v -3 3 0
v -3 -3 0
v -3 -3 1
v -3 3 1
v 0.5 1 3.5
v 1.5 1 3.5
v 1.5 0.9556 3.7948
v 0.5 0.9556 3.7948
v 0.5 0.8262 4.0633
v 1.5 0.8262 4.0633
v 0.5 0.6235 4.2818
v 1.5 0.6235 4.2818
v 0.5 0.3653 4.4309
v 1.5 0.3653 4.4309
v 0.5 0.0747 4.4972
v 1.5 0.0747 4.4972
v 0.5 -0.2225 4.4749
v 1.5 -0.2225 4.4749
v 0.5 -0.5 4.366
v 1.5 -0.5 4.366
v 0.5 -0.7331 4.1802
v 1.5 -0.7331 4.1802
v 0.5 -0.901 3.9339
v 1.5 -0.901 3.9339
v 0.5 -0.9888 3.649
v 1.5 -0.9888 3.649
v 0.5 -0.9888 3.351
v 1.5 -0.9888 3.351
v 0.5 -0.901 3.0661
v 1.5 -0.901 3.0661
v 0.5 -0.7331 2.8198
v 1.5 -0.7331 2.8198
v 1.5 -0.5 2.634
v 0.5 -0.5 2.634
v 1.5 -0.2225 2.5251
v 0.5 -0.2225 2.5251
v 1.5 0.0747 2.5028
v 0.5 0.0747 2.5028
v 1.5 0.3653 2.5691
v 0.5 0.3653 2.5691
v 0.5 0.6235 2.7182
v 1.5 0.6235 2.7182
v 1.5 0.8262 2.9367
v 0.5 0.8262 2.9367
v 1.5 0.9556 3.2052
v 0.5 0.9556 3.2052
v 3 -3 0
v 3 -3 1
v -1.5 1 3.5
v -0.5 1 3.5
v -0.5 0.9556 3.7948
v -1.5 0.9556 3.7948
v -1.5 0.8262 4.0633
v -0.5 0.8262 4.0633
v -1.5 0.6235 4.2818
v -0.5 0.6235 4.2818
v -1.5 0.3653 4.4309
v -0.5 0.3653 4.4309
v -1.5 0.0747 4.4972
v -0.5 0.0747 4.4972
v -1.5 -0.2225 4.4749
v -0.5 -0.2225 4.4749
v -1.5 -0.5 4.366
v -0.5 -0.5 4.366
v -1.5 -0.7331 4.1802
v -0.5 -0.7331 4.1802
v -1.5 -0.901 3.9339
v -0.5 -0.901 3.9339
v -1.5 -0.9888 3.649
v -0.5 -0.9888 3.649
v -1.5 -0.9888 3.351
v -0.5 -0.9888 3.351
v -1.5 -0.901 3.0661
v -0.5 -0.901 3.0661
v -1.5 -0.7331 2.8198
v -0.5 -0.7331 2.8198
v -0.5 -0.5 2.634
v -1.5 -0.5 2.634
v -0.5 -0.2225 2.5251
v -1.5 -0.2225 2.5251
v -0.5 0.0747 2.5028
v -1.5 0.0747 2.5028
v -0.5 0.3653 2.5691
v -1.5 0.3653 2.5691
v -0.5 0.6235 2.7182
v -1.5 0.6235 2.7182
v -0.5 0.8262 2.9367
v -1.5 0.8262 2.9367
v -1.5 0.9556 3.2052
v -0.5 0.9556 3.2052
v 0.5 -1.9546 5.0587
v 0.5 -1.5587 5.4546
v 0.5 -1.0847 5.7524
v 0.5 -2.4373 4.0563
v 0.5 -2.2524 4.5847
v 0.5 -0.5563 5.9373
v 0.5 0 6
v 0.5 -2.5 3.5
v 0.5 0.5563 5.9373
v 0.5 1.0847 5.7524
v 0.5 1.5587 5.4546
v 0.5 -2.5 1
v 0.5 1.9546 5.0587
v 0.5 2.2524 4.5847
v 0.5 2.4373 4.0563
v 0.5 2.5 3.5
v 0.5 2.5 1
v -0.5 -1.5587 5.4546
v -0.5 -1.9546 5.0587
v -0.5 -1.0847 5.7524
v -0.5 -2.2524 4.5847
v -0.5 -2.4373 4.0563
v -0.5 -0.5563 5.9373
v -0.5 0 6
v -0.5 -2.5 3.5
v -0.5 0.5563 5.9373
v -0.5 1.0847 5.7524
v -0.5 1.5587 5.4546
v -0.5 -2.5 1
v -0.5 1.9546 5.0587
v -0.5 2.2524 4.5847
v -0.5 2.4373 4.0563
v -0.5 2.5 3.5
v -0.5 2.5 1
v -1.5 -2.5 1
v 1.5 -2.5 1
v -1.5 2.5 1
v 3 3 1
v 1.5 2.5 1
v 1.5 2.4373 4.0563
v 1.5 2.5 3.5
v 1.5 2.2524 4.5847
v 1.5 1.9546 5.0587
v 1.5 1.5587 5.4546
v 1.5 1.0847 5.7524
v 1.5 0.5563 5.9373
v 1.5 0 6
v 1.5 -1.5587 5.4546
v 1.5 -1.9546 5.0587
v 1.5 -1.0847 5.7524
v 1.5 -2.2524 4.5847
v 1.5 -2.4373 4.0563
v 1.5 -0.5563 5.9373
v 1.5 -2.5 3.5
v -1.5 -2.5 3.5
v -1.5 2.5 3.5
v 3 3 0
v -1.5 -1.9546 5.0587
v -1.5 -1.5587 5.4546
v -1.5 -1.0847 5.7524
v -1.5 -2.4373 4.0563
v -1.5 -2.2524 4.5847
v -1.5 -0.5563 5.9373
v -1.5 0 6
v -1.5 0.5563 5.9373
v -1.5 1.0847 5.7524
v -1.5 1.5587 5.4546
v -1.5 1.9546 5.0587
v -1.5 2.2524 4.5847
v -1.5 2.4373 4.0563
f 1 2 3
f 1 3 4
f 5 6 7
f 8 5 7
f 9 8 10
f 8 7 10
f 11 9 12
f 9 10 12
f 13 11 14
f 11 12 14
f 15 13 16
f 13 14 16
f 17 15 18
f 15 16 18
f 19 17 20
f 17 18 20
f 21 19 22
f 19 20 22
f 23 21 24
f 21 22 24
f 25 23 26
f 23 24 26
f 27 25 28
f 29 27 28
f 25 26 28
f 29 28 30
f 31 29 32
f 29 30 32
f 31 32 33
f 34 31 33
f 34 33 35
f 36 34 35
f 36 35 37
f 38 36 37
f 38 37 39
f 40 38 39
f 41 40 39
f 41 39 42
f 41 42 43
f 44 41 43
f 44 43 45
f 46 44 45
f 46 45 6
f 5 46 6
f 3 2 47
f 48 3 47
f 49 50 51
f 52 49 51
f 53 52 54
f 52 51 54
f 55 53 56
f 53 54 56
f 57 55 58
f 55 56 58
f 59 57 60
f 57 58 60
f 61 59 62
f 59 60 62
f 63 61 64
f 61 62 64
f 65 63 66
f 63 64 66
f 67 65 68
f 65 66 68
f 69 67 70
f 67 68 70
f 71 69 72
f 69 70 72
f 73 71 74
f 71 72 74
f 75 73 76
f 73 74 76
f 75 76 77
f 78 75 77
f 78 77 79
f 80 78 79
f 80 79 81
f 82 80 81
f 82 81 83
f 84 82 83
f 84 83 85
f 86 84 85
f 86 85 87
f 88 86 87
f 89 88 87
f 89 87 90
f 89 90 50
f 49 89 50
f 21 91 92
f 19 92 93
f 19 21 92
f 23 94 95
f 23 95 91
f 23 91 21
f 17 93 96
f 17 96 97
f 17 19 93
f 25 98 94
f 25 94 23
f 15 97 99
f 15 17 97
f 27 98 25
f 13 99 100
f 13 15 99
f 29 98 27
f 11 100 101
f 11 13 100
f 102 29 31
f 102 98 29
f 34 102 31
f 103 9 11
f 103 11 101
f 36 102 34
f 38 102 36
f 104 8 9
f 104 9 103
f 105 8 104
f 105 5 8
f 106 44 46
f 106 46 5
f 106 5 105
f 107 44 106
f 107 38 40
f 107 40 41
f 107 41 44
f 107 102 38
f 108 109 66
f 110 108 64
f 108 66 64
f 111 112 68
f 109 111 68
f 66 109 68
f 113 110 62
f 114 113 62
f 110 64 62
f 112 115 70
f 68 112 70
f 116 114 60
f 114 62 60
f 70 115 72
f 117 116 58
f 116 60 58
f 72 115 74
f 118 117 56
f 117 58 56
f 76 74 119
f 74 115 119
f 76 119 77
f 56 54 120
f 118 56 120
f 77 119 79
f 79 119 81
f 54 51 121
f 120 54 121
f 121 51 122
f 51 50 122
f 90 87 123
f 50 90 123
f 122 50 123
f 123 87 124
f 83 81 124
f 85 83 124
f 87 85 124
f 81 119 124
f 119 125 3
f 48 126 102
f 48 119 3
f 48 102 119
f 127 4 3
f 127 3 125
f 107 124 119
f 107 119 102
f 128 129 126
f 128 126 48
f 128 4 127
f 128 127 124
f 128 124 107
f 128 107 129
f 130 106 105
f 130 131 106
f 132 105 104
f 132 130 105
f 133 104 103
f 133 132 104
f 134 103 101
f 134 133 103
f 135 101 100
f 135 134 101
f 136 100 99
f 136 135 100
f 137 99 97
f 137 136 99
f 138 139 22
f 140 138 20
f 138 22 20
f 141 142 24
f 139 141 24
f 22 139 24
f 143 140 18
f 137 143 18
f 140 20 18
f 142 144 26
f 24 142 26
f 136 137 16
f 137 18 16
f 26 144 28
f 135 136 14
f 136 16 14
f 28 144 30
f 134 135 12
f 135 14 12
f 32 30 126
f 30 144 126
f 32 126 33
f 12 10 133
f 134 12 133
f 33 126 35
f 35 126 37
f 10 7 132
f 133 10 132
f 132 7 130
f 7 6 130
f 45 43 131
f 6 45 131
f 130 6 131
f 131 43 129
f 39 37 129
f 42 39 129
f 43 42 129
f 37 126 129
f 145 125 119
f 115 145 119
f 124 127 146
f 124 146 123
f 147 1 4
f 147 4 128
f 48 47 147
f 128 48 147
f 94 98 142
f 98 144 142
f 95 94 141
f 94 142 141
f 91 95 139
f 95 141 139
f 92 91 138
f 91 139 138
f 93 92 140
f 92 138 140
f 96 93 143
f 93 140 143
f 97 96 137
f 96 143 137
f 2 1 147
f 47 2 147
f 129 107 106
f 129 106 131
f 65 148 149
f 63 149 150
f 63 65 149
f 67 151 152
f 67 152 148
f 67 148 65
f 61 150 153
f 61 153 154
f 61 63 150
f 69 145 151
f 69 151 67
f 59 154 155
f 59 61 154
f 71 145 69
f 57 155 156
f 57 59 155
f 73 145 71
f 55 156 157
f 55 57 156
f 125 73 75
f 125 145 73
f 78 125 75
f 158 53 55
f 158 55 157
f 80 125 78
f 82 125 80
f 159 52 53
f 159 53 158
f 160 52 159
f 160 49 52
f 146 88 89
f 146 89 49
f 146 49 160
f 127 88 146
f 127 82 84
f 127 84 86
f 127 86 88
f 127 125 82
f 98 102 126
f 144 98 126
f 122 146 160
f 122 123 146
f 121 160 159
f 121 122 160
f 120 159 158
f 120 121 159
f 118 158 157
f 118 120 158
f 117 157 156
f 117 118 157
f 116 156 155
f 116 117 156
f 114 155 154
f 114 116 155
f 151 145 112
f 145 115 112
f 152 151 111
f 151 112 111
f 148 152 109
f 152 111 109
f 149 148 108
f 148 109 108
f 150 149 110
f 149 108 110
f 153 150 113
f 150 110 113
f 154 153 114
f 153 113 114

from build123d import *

# Parameters (mm, degrees)
F0_W     = 6
F0_H     = 6
F0_W_2   = 1
F0_H_2   = 5
F1_DEPTH = 1
F2_DEPTH = 6
F3_R     = 2.49999
F4_R     = 1
F5_DEPTH = 25


# Not quite as in the source:
# - a fillet or chamfer is up to 0.001 mm smaller than in the source, because OpenCascade refuses the exact size


with BuildPart() as f1:
    # F0 (on Top) → F1 (new body)
    with BuildSketch(Plane.XY):
        Rectangle(F0_W, F0_H)
        Polygon((2.5, 2.5), (2.5, -2.5), (1.5, -2.5), (0.5, -2.5), (-0.5, -2.5), (-1.5, -2.5), (-2.5, -2.5), (-2.5, 2.5), (-1.5, 2.5), (-0.5, 2.5), (0.5, 2.5), (1.5, 2.5), align=None, mode=Mode.SUBTRACT)
        with Locations((2, 0)):
            Rectangle(F0_W_2, F0_H_2)
        with Locations((1, 0)):
            Rectangle(F0_W_2, F0_H_2)
        Rectangle(F0_W_2, F0_H_2)
        with Locations((-1, 0)):
            Rectangle(F0_W_2, F0_H_2)
        with Locations((-2, 0)):
            Rectangle(F0_W_2, F0_H_2)
    extrude(amount=F1_DEPTH)

    # F0 (on Top) → F2 (join)
    with BuildSketch(Plane.XY):
        with Locations((1, 0)):
            Rectangle(F0_W_2, F0_H_2)
        with Locations((-1, 0)):
            Rectangle(F0_W_2, F0_H_2)
    extrude(amount=F2_DEPTH)

    # F3 (radius 2.5 in the source; OpenCascade refuses exactly that, so slightly less here)
    f3_edges = [f1.edges().sort_by_distance(p)[0] for p in [
        (-1, -2.5, 6),
        (1, -2.5, 6),
        (-1, 2.5, 6),
        (1, 2.5, 6),
    ]]
    fillet(f3_edges, radius=F3_R)

    # F4 (on face) → F5 (cut)
    with BuildSketch(Plane.YZ.offset(1.5)):
        with Locations((0, 3.5)):
            Circle(F4_R)
    extrude(amount=-F5_DEPTH, mode=Mode.SUBTRACT)


solid = f1.part
